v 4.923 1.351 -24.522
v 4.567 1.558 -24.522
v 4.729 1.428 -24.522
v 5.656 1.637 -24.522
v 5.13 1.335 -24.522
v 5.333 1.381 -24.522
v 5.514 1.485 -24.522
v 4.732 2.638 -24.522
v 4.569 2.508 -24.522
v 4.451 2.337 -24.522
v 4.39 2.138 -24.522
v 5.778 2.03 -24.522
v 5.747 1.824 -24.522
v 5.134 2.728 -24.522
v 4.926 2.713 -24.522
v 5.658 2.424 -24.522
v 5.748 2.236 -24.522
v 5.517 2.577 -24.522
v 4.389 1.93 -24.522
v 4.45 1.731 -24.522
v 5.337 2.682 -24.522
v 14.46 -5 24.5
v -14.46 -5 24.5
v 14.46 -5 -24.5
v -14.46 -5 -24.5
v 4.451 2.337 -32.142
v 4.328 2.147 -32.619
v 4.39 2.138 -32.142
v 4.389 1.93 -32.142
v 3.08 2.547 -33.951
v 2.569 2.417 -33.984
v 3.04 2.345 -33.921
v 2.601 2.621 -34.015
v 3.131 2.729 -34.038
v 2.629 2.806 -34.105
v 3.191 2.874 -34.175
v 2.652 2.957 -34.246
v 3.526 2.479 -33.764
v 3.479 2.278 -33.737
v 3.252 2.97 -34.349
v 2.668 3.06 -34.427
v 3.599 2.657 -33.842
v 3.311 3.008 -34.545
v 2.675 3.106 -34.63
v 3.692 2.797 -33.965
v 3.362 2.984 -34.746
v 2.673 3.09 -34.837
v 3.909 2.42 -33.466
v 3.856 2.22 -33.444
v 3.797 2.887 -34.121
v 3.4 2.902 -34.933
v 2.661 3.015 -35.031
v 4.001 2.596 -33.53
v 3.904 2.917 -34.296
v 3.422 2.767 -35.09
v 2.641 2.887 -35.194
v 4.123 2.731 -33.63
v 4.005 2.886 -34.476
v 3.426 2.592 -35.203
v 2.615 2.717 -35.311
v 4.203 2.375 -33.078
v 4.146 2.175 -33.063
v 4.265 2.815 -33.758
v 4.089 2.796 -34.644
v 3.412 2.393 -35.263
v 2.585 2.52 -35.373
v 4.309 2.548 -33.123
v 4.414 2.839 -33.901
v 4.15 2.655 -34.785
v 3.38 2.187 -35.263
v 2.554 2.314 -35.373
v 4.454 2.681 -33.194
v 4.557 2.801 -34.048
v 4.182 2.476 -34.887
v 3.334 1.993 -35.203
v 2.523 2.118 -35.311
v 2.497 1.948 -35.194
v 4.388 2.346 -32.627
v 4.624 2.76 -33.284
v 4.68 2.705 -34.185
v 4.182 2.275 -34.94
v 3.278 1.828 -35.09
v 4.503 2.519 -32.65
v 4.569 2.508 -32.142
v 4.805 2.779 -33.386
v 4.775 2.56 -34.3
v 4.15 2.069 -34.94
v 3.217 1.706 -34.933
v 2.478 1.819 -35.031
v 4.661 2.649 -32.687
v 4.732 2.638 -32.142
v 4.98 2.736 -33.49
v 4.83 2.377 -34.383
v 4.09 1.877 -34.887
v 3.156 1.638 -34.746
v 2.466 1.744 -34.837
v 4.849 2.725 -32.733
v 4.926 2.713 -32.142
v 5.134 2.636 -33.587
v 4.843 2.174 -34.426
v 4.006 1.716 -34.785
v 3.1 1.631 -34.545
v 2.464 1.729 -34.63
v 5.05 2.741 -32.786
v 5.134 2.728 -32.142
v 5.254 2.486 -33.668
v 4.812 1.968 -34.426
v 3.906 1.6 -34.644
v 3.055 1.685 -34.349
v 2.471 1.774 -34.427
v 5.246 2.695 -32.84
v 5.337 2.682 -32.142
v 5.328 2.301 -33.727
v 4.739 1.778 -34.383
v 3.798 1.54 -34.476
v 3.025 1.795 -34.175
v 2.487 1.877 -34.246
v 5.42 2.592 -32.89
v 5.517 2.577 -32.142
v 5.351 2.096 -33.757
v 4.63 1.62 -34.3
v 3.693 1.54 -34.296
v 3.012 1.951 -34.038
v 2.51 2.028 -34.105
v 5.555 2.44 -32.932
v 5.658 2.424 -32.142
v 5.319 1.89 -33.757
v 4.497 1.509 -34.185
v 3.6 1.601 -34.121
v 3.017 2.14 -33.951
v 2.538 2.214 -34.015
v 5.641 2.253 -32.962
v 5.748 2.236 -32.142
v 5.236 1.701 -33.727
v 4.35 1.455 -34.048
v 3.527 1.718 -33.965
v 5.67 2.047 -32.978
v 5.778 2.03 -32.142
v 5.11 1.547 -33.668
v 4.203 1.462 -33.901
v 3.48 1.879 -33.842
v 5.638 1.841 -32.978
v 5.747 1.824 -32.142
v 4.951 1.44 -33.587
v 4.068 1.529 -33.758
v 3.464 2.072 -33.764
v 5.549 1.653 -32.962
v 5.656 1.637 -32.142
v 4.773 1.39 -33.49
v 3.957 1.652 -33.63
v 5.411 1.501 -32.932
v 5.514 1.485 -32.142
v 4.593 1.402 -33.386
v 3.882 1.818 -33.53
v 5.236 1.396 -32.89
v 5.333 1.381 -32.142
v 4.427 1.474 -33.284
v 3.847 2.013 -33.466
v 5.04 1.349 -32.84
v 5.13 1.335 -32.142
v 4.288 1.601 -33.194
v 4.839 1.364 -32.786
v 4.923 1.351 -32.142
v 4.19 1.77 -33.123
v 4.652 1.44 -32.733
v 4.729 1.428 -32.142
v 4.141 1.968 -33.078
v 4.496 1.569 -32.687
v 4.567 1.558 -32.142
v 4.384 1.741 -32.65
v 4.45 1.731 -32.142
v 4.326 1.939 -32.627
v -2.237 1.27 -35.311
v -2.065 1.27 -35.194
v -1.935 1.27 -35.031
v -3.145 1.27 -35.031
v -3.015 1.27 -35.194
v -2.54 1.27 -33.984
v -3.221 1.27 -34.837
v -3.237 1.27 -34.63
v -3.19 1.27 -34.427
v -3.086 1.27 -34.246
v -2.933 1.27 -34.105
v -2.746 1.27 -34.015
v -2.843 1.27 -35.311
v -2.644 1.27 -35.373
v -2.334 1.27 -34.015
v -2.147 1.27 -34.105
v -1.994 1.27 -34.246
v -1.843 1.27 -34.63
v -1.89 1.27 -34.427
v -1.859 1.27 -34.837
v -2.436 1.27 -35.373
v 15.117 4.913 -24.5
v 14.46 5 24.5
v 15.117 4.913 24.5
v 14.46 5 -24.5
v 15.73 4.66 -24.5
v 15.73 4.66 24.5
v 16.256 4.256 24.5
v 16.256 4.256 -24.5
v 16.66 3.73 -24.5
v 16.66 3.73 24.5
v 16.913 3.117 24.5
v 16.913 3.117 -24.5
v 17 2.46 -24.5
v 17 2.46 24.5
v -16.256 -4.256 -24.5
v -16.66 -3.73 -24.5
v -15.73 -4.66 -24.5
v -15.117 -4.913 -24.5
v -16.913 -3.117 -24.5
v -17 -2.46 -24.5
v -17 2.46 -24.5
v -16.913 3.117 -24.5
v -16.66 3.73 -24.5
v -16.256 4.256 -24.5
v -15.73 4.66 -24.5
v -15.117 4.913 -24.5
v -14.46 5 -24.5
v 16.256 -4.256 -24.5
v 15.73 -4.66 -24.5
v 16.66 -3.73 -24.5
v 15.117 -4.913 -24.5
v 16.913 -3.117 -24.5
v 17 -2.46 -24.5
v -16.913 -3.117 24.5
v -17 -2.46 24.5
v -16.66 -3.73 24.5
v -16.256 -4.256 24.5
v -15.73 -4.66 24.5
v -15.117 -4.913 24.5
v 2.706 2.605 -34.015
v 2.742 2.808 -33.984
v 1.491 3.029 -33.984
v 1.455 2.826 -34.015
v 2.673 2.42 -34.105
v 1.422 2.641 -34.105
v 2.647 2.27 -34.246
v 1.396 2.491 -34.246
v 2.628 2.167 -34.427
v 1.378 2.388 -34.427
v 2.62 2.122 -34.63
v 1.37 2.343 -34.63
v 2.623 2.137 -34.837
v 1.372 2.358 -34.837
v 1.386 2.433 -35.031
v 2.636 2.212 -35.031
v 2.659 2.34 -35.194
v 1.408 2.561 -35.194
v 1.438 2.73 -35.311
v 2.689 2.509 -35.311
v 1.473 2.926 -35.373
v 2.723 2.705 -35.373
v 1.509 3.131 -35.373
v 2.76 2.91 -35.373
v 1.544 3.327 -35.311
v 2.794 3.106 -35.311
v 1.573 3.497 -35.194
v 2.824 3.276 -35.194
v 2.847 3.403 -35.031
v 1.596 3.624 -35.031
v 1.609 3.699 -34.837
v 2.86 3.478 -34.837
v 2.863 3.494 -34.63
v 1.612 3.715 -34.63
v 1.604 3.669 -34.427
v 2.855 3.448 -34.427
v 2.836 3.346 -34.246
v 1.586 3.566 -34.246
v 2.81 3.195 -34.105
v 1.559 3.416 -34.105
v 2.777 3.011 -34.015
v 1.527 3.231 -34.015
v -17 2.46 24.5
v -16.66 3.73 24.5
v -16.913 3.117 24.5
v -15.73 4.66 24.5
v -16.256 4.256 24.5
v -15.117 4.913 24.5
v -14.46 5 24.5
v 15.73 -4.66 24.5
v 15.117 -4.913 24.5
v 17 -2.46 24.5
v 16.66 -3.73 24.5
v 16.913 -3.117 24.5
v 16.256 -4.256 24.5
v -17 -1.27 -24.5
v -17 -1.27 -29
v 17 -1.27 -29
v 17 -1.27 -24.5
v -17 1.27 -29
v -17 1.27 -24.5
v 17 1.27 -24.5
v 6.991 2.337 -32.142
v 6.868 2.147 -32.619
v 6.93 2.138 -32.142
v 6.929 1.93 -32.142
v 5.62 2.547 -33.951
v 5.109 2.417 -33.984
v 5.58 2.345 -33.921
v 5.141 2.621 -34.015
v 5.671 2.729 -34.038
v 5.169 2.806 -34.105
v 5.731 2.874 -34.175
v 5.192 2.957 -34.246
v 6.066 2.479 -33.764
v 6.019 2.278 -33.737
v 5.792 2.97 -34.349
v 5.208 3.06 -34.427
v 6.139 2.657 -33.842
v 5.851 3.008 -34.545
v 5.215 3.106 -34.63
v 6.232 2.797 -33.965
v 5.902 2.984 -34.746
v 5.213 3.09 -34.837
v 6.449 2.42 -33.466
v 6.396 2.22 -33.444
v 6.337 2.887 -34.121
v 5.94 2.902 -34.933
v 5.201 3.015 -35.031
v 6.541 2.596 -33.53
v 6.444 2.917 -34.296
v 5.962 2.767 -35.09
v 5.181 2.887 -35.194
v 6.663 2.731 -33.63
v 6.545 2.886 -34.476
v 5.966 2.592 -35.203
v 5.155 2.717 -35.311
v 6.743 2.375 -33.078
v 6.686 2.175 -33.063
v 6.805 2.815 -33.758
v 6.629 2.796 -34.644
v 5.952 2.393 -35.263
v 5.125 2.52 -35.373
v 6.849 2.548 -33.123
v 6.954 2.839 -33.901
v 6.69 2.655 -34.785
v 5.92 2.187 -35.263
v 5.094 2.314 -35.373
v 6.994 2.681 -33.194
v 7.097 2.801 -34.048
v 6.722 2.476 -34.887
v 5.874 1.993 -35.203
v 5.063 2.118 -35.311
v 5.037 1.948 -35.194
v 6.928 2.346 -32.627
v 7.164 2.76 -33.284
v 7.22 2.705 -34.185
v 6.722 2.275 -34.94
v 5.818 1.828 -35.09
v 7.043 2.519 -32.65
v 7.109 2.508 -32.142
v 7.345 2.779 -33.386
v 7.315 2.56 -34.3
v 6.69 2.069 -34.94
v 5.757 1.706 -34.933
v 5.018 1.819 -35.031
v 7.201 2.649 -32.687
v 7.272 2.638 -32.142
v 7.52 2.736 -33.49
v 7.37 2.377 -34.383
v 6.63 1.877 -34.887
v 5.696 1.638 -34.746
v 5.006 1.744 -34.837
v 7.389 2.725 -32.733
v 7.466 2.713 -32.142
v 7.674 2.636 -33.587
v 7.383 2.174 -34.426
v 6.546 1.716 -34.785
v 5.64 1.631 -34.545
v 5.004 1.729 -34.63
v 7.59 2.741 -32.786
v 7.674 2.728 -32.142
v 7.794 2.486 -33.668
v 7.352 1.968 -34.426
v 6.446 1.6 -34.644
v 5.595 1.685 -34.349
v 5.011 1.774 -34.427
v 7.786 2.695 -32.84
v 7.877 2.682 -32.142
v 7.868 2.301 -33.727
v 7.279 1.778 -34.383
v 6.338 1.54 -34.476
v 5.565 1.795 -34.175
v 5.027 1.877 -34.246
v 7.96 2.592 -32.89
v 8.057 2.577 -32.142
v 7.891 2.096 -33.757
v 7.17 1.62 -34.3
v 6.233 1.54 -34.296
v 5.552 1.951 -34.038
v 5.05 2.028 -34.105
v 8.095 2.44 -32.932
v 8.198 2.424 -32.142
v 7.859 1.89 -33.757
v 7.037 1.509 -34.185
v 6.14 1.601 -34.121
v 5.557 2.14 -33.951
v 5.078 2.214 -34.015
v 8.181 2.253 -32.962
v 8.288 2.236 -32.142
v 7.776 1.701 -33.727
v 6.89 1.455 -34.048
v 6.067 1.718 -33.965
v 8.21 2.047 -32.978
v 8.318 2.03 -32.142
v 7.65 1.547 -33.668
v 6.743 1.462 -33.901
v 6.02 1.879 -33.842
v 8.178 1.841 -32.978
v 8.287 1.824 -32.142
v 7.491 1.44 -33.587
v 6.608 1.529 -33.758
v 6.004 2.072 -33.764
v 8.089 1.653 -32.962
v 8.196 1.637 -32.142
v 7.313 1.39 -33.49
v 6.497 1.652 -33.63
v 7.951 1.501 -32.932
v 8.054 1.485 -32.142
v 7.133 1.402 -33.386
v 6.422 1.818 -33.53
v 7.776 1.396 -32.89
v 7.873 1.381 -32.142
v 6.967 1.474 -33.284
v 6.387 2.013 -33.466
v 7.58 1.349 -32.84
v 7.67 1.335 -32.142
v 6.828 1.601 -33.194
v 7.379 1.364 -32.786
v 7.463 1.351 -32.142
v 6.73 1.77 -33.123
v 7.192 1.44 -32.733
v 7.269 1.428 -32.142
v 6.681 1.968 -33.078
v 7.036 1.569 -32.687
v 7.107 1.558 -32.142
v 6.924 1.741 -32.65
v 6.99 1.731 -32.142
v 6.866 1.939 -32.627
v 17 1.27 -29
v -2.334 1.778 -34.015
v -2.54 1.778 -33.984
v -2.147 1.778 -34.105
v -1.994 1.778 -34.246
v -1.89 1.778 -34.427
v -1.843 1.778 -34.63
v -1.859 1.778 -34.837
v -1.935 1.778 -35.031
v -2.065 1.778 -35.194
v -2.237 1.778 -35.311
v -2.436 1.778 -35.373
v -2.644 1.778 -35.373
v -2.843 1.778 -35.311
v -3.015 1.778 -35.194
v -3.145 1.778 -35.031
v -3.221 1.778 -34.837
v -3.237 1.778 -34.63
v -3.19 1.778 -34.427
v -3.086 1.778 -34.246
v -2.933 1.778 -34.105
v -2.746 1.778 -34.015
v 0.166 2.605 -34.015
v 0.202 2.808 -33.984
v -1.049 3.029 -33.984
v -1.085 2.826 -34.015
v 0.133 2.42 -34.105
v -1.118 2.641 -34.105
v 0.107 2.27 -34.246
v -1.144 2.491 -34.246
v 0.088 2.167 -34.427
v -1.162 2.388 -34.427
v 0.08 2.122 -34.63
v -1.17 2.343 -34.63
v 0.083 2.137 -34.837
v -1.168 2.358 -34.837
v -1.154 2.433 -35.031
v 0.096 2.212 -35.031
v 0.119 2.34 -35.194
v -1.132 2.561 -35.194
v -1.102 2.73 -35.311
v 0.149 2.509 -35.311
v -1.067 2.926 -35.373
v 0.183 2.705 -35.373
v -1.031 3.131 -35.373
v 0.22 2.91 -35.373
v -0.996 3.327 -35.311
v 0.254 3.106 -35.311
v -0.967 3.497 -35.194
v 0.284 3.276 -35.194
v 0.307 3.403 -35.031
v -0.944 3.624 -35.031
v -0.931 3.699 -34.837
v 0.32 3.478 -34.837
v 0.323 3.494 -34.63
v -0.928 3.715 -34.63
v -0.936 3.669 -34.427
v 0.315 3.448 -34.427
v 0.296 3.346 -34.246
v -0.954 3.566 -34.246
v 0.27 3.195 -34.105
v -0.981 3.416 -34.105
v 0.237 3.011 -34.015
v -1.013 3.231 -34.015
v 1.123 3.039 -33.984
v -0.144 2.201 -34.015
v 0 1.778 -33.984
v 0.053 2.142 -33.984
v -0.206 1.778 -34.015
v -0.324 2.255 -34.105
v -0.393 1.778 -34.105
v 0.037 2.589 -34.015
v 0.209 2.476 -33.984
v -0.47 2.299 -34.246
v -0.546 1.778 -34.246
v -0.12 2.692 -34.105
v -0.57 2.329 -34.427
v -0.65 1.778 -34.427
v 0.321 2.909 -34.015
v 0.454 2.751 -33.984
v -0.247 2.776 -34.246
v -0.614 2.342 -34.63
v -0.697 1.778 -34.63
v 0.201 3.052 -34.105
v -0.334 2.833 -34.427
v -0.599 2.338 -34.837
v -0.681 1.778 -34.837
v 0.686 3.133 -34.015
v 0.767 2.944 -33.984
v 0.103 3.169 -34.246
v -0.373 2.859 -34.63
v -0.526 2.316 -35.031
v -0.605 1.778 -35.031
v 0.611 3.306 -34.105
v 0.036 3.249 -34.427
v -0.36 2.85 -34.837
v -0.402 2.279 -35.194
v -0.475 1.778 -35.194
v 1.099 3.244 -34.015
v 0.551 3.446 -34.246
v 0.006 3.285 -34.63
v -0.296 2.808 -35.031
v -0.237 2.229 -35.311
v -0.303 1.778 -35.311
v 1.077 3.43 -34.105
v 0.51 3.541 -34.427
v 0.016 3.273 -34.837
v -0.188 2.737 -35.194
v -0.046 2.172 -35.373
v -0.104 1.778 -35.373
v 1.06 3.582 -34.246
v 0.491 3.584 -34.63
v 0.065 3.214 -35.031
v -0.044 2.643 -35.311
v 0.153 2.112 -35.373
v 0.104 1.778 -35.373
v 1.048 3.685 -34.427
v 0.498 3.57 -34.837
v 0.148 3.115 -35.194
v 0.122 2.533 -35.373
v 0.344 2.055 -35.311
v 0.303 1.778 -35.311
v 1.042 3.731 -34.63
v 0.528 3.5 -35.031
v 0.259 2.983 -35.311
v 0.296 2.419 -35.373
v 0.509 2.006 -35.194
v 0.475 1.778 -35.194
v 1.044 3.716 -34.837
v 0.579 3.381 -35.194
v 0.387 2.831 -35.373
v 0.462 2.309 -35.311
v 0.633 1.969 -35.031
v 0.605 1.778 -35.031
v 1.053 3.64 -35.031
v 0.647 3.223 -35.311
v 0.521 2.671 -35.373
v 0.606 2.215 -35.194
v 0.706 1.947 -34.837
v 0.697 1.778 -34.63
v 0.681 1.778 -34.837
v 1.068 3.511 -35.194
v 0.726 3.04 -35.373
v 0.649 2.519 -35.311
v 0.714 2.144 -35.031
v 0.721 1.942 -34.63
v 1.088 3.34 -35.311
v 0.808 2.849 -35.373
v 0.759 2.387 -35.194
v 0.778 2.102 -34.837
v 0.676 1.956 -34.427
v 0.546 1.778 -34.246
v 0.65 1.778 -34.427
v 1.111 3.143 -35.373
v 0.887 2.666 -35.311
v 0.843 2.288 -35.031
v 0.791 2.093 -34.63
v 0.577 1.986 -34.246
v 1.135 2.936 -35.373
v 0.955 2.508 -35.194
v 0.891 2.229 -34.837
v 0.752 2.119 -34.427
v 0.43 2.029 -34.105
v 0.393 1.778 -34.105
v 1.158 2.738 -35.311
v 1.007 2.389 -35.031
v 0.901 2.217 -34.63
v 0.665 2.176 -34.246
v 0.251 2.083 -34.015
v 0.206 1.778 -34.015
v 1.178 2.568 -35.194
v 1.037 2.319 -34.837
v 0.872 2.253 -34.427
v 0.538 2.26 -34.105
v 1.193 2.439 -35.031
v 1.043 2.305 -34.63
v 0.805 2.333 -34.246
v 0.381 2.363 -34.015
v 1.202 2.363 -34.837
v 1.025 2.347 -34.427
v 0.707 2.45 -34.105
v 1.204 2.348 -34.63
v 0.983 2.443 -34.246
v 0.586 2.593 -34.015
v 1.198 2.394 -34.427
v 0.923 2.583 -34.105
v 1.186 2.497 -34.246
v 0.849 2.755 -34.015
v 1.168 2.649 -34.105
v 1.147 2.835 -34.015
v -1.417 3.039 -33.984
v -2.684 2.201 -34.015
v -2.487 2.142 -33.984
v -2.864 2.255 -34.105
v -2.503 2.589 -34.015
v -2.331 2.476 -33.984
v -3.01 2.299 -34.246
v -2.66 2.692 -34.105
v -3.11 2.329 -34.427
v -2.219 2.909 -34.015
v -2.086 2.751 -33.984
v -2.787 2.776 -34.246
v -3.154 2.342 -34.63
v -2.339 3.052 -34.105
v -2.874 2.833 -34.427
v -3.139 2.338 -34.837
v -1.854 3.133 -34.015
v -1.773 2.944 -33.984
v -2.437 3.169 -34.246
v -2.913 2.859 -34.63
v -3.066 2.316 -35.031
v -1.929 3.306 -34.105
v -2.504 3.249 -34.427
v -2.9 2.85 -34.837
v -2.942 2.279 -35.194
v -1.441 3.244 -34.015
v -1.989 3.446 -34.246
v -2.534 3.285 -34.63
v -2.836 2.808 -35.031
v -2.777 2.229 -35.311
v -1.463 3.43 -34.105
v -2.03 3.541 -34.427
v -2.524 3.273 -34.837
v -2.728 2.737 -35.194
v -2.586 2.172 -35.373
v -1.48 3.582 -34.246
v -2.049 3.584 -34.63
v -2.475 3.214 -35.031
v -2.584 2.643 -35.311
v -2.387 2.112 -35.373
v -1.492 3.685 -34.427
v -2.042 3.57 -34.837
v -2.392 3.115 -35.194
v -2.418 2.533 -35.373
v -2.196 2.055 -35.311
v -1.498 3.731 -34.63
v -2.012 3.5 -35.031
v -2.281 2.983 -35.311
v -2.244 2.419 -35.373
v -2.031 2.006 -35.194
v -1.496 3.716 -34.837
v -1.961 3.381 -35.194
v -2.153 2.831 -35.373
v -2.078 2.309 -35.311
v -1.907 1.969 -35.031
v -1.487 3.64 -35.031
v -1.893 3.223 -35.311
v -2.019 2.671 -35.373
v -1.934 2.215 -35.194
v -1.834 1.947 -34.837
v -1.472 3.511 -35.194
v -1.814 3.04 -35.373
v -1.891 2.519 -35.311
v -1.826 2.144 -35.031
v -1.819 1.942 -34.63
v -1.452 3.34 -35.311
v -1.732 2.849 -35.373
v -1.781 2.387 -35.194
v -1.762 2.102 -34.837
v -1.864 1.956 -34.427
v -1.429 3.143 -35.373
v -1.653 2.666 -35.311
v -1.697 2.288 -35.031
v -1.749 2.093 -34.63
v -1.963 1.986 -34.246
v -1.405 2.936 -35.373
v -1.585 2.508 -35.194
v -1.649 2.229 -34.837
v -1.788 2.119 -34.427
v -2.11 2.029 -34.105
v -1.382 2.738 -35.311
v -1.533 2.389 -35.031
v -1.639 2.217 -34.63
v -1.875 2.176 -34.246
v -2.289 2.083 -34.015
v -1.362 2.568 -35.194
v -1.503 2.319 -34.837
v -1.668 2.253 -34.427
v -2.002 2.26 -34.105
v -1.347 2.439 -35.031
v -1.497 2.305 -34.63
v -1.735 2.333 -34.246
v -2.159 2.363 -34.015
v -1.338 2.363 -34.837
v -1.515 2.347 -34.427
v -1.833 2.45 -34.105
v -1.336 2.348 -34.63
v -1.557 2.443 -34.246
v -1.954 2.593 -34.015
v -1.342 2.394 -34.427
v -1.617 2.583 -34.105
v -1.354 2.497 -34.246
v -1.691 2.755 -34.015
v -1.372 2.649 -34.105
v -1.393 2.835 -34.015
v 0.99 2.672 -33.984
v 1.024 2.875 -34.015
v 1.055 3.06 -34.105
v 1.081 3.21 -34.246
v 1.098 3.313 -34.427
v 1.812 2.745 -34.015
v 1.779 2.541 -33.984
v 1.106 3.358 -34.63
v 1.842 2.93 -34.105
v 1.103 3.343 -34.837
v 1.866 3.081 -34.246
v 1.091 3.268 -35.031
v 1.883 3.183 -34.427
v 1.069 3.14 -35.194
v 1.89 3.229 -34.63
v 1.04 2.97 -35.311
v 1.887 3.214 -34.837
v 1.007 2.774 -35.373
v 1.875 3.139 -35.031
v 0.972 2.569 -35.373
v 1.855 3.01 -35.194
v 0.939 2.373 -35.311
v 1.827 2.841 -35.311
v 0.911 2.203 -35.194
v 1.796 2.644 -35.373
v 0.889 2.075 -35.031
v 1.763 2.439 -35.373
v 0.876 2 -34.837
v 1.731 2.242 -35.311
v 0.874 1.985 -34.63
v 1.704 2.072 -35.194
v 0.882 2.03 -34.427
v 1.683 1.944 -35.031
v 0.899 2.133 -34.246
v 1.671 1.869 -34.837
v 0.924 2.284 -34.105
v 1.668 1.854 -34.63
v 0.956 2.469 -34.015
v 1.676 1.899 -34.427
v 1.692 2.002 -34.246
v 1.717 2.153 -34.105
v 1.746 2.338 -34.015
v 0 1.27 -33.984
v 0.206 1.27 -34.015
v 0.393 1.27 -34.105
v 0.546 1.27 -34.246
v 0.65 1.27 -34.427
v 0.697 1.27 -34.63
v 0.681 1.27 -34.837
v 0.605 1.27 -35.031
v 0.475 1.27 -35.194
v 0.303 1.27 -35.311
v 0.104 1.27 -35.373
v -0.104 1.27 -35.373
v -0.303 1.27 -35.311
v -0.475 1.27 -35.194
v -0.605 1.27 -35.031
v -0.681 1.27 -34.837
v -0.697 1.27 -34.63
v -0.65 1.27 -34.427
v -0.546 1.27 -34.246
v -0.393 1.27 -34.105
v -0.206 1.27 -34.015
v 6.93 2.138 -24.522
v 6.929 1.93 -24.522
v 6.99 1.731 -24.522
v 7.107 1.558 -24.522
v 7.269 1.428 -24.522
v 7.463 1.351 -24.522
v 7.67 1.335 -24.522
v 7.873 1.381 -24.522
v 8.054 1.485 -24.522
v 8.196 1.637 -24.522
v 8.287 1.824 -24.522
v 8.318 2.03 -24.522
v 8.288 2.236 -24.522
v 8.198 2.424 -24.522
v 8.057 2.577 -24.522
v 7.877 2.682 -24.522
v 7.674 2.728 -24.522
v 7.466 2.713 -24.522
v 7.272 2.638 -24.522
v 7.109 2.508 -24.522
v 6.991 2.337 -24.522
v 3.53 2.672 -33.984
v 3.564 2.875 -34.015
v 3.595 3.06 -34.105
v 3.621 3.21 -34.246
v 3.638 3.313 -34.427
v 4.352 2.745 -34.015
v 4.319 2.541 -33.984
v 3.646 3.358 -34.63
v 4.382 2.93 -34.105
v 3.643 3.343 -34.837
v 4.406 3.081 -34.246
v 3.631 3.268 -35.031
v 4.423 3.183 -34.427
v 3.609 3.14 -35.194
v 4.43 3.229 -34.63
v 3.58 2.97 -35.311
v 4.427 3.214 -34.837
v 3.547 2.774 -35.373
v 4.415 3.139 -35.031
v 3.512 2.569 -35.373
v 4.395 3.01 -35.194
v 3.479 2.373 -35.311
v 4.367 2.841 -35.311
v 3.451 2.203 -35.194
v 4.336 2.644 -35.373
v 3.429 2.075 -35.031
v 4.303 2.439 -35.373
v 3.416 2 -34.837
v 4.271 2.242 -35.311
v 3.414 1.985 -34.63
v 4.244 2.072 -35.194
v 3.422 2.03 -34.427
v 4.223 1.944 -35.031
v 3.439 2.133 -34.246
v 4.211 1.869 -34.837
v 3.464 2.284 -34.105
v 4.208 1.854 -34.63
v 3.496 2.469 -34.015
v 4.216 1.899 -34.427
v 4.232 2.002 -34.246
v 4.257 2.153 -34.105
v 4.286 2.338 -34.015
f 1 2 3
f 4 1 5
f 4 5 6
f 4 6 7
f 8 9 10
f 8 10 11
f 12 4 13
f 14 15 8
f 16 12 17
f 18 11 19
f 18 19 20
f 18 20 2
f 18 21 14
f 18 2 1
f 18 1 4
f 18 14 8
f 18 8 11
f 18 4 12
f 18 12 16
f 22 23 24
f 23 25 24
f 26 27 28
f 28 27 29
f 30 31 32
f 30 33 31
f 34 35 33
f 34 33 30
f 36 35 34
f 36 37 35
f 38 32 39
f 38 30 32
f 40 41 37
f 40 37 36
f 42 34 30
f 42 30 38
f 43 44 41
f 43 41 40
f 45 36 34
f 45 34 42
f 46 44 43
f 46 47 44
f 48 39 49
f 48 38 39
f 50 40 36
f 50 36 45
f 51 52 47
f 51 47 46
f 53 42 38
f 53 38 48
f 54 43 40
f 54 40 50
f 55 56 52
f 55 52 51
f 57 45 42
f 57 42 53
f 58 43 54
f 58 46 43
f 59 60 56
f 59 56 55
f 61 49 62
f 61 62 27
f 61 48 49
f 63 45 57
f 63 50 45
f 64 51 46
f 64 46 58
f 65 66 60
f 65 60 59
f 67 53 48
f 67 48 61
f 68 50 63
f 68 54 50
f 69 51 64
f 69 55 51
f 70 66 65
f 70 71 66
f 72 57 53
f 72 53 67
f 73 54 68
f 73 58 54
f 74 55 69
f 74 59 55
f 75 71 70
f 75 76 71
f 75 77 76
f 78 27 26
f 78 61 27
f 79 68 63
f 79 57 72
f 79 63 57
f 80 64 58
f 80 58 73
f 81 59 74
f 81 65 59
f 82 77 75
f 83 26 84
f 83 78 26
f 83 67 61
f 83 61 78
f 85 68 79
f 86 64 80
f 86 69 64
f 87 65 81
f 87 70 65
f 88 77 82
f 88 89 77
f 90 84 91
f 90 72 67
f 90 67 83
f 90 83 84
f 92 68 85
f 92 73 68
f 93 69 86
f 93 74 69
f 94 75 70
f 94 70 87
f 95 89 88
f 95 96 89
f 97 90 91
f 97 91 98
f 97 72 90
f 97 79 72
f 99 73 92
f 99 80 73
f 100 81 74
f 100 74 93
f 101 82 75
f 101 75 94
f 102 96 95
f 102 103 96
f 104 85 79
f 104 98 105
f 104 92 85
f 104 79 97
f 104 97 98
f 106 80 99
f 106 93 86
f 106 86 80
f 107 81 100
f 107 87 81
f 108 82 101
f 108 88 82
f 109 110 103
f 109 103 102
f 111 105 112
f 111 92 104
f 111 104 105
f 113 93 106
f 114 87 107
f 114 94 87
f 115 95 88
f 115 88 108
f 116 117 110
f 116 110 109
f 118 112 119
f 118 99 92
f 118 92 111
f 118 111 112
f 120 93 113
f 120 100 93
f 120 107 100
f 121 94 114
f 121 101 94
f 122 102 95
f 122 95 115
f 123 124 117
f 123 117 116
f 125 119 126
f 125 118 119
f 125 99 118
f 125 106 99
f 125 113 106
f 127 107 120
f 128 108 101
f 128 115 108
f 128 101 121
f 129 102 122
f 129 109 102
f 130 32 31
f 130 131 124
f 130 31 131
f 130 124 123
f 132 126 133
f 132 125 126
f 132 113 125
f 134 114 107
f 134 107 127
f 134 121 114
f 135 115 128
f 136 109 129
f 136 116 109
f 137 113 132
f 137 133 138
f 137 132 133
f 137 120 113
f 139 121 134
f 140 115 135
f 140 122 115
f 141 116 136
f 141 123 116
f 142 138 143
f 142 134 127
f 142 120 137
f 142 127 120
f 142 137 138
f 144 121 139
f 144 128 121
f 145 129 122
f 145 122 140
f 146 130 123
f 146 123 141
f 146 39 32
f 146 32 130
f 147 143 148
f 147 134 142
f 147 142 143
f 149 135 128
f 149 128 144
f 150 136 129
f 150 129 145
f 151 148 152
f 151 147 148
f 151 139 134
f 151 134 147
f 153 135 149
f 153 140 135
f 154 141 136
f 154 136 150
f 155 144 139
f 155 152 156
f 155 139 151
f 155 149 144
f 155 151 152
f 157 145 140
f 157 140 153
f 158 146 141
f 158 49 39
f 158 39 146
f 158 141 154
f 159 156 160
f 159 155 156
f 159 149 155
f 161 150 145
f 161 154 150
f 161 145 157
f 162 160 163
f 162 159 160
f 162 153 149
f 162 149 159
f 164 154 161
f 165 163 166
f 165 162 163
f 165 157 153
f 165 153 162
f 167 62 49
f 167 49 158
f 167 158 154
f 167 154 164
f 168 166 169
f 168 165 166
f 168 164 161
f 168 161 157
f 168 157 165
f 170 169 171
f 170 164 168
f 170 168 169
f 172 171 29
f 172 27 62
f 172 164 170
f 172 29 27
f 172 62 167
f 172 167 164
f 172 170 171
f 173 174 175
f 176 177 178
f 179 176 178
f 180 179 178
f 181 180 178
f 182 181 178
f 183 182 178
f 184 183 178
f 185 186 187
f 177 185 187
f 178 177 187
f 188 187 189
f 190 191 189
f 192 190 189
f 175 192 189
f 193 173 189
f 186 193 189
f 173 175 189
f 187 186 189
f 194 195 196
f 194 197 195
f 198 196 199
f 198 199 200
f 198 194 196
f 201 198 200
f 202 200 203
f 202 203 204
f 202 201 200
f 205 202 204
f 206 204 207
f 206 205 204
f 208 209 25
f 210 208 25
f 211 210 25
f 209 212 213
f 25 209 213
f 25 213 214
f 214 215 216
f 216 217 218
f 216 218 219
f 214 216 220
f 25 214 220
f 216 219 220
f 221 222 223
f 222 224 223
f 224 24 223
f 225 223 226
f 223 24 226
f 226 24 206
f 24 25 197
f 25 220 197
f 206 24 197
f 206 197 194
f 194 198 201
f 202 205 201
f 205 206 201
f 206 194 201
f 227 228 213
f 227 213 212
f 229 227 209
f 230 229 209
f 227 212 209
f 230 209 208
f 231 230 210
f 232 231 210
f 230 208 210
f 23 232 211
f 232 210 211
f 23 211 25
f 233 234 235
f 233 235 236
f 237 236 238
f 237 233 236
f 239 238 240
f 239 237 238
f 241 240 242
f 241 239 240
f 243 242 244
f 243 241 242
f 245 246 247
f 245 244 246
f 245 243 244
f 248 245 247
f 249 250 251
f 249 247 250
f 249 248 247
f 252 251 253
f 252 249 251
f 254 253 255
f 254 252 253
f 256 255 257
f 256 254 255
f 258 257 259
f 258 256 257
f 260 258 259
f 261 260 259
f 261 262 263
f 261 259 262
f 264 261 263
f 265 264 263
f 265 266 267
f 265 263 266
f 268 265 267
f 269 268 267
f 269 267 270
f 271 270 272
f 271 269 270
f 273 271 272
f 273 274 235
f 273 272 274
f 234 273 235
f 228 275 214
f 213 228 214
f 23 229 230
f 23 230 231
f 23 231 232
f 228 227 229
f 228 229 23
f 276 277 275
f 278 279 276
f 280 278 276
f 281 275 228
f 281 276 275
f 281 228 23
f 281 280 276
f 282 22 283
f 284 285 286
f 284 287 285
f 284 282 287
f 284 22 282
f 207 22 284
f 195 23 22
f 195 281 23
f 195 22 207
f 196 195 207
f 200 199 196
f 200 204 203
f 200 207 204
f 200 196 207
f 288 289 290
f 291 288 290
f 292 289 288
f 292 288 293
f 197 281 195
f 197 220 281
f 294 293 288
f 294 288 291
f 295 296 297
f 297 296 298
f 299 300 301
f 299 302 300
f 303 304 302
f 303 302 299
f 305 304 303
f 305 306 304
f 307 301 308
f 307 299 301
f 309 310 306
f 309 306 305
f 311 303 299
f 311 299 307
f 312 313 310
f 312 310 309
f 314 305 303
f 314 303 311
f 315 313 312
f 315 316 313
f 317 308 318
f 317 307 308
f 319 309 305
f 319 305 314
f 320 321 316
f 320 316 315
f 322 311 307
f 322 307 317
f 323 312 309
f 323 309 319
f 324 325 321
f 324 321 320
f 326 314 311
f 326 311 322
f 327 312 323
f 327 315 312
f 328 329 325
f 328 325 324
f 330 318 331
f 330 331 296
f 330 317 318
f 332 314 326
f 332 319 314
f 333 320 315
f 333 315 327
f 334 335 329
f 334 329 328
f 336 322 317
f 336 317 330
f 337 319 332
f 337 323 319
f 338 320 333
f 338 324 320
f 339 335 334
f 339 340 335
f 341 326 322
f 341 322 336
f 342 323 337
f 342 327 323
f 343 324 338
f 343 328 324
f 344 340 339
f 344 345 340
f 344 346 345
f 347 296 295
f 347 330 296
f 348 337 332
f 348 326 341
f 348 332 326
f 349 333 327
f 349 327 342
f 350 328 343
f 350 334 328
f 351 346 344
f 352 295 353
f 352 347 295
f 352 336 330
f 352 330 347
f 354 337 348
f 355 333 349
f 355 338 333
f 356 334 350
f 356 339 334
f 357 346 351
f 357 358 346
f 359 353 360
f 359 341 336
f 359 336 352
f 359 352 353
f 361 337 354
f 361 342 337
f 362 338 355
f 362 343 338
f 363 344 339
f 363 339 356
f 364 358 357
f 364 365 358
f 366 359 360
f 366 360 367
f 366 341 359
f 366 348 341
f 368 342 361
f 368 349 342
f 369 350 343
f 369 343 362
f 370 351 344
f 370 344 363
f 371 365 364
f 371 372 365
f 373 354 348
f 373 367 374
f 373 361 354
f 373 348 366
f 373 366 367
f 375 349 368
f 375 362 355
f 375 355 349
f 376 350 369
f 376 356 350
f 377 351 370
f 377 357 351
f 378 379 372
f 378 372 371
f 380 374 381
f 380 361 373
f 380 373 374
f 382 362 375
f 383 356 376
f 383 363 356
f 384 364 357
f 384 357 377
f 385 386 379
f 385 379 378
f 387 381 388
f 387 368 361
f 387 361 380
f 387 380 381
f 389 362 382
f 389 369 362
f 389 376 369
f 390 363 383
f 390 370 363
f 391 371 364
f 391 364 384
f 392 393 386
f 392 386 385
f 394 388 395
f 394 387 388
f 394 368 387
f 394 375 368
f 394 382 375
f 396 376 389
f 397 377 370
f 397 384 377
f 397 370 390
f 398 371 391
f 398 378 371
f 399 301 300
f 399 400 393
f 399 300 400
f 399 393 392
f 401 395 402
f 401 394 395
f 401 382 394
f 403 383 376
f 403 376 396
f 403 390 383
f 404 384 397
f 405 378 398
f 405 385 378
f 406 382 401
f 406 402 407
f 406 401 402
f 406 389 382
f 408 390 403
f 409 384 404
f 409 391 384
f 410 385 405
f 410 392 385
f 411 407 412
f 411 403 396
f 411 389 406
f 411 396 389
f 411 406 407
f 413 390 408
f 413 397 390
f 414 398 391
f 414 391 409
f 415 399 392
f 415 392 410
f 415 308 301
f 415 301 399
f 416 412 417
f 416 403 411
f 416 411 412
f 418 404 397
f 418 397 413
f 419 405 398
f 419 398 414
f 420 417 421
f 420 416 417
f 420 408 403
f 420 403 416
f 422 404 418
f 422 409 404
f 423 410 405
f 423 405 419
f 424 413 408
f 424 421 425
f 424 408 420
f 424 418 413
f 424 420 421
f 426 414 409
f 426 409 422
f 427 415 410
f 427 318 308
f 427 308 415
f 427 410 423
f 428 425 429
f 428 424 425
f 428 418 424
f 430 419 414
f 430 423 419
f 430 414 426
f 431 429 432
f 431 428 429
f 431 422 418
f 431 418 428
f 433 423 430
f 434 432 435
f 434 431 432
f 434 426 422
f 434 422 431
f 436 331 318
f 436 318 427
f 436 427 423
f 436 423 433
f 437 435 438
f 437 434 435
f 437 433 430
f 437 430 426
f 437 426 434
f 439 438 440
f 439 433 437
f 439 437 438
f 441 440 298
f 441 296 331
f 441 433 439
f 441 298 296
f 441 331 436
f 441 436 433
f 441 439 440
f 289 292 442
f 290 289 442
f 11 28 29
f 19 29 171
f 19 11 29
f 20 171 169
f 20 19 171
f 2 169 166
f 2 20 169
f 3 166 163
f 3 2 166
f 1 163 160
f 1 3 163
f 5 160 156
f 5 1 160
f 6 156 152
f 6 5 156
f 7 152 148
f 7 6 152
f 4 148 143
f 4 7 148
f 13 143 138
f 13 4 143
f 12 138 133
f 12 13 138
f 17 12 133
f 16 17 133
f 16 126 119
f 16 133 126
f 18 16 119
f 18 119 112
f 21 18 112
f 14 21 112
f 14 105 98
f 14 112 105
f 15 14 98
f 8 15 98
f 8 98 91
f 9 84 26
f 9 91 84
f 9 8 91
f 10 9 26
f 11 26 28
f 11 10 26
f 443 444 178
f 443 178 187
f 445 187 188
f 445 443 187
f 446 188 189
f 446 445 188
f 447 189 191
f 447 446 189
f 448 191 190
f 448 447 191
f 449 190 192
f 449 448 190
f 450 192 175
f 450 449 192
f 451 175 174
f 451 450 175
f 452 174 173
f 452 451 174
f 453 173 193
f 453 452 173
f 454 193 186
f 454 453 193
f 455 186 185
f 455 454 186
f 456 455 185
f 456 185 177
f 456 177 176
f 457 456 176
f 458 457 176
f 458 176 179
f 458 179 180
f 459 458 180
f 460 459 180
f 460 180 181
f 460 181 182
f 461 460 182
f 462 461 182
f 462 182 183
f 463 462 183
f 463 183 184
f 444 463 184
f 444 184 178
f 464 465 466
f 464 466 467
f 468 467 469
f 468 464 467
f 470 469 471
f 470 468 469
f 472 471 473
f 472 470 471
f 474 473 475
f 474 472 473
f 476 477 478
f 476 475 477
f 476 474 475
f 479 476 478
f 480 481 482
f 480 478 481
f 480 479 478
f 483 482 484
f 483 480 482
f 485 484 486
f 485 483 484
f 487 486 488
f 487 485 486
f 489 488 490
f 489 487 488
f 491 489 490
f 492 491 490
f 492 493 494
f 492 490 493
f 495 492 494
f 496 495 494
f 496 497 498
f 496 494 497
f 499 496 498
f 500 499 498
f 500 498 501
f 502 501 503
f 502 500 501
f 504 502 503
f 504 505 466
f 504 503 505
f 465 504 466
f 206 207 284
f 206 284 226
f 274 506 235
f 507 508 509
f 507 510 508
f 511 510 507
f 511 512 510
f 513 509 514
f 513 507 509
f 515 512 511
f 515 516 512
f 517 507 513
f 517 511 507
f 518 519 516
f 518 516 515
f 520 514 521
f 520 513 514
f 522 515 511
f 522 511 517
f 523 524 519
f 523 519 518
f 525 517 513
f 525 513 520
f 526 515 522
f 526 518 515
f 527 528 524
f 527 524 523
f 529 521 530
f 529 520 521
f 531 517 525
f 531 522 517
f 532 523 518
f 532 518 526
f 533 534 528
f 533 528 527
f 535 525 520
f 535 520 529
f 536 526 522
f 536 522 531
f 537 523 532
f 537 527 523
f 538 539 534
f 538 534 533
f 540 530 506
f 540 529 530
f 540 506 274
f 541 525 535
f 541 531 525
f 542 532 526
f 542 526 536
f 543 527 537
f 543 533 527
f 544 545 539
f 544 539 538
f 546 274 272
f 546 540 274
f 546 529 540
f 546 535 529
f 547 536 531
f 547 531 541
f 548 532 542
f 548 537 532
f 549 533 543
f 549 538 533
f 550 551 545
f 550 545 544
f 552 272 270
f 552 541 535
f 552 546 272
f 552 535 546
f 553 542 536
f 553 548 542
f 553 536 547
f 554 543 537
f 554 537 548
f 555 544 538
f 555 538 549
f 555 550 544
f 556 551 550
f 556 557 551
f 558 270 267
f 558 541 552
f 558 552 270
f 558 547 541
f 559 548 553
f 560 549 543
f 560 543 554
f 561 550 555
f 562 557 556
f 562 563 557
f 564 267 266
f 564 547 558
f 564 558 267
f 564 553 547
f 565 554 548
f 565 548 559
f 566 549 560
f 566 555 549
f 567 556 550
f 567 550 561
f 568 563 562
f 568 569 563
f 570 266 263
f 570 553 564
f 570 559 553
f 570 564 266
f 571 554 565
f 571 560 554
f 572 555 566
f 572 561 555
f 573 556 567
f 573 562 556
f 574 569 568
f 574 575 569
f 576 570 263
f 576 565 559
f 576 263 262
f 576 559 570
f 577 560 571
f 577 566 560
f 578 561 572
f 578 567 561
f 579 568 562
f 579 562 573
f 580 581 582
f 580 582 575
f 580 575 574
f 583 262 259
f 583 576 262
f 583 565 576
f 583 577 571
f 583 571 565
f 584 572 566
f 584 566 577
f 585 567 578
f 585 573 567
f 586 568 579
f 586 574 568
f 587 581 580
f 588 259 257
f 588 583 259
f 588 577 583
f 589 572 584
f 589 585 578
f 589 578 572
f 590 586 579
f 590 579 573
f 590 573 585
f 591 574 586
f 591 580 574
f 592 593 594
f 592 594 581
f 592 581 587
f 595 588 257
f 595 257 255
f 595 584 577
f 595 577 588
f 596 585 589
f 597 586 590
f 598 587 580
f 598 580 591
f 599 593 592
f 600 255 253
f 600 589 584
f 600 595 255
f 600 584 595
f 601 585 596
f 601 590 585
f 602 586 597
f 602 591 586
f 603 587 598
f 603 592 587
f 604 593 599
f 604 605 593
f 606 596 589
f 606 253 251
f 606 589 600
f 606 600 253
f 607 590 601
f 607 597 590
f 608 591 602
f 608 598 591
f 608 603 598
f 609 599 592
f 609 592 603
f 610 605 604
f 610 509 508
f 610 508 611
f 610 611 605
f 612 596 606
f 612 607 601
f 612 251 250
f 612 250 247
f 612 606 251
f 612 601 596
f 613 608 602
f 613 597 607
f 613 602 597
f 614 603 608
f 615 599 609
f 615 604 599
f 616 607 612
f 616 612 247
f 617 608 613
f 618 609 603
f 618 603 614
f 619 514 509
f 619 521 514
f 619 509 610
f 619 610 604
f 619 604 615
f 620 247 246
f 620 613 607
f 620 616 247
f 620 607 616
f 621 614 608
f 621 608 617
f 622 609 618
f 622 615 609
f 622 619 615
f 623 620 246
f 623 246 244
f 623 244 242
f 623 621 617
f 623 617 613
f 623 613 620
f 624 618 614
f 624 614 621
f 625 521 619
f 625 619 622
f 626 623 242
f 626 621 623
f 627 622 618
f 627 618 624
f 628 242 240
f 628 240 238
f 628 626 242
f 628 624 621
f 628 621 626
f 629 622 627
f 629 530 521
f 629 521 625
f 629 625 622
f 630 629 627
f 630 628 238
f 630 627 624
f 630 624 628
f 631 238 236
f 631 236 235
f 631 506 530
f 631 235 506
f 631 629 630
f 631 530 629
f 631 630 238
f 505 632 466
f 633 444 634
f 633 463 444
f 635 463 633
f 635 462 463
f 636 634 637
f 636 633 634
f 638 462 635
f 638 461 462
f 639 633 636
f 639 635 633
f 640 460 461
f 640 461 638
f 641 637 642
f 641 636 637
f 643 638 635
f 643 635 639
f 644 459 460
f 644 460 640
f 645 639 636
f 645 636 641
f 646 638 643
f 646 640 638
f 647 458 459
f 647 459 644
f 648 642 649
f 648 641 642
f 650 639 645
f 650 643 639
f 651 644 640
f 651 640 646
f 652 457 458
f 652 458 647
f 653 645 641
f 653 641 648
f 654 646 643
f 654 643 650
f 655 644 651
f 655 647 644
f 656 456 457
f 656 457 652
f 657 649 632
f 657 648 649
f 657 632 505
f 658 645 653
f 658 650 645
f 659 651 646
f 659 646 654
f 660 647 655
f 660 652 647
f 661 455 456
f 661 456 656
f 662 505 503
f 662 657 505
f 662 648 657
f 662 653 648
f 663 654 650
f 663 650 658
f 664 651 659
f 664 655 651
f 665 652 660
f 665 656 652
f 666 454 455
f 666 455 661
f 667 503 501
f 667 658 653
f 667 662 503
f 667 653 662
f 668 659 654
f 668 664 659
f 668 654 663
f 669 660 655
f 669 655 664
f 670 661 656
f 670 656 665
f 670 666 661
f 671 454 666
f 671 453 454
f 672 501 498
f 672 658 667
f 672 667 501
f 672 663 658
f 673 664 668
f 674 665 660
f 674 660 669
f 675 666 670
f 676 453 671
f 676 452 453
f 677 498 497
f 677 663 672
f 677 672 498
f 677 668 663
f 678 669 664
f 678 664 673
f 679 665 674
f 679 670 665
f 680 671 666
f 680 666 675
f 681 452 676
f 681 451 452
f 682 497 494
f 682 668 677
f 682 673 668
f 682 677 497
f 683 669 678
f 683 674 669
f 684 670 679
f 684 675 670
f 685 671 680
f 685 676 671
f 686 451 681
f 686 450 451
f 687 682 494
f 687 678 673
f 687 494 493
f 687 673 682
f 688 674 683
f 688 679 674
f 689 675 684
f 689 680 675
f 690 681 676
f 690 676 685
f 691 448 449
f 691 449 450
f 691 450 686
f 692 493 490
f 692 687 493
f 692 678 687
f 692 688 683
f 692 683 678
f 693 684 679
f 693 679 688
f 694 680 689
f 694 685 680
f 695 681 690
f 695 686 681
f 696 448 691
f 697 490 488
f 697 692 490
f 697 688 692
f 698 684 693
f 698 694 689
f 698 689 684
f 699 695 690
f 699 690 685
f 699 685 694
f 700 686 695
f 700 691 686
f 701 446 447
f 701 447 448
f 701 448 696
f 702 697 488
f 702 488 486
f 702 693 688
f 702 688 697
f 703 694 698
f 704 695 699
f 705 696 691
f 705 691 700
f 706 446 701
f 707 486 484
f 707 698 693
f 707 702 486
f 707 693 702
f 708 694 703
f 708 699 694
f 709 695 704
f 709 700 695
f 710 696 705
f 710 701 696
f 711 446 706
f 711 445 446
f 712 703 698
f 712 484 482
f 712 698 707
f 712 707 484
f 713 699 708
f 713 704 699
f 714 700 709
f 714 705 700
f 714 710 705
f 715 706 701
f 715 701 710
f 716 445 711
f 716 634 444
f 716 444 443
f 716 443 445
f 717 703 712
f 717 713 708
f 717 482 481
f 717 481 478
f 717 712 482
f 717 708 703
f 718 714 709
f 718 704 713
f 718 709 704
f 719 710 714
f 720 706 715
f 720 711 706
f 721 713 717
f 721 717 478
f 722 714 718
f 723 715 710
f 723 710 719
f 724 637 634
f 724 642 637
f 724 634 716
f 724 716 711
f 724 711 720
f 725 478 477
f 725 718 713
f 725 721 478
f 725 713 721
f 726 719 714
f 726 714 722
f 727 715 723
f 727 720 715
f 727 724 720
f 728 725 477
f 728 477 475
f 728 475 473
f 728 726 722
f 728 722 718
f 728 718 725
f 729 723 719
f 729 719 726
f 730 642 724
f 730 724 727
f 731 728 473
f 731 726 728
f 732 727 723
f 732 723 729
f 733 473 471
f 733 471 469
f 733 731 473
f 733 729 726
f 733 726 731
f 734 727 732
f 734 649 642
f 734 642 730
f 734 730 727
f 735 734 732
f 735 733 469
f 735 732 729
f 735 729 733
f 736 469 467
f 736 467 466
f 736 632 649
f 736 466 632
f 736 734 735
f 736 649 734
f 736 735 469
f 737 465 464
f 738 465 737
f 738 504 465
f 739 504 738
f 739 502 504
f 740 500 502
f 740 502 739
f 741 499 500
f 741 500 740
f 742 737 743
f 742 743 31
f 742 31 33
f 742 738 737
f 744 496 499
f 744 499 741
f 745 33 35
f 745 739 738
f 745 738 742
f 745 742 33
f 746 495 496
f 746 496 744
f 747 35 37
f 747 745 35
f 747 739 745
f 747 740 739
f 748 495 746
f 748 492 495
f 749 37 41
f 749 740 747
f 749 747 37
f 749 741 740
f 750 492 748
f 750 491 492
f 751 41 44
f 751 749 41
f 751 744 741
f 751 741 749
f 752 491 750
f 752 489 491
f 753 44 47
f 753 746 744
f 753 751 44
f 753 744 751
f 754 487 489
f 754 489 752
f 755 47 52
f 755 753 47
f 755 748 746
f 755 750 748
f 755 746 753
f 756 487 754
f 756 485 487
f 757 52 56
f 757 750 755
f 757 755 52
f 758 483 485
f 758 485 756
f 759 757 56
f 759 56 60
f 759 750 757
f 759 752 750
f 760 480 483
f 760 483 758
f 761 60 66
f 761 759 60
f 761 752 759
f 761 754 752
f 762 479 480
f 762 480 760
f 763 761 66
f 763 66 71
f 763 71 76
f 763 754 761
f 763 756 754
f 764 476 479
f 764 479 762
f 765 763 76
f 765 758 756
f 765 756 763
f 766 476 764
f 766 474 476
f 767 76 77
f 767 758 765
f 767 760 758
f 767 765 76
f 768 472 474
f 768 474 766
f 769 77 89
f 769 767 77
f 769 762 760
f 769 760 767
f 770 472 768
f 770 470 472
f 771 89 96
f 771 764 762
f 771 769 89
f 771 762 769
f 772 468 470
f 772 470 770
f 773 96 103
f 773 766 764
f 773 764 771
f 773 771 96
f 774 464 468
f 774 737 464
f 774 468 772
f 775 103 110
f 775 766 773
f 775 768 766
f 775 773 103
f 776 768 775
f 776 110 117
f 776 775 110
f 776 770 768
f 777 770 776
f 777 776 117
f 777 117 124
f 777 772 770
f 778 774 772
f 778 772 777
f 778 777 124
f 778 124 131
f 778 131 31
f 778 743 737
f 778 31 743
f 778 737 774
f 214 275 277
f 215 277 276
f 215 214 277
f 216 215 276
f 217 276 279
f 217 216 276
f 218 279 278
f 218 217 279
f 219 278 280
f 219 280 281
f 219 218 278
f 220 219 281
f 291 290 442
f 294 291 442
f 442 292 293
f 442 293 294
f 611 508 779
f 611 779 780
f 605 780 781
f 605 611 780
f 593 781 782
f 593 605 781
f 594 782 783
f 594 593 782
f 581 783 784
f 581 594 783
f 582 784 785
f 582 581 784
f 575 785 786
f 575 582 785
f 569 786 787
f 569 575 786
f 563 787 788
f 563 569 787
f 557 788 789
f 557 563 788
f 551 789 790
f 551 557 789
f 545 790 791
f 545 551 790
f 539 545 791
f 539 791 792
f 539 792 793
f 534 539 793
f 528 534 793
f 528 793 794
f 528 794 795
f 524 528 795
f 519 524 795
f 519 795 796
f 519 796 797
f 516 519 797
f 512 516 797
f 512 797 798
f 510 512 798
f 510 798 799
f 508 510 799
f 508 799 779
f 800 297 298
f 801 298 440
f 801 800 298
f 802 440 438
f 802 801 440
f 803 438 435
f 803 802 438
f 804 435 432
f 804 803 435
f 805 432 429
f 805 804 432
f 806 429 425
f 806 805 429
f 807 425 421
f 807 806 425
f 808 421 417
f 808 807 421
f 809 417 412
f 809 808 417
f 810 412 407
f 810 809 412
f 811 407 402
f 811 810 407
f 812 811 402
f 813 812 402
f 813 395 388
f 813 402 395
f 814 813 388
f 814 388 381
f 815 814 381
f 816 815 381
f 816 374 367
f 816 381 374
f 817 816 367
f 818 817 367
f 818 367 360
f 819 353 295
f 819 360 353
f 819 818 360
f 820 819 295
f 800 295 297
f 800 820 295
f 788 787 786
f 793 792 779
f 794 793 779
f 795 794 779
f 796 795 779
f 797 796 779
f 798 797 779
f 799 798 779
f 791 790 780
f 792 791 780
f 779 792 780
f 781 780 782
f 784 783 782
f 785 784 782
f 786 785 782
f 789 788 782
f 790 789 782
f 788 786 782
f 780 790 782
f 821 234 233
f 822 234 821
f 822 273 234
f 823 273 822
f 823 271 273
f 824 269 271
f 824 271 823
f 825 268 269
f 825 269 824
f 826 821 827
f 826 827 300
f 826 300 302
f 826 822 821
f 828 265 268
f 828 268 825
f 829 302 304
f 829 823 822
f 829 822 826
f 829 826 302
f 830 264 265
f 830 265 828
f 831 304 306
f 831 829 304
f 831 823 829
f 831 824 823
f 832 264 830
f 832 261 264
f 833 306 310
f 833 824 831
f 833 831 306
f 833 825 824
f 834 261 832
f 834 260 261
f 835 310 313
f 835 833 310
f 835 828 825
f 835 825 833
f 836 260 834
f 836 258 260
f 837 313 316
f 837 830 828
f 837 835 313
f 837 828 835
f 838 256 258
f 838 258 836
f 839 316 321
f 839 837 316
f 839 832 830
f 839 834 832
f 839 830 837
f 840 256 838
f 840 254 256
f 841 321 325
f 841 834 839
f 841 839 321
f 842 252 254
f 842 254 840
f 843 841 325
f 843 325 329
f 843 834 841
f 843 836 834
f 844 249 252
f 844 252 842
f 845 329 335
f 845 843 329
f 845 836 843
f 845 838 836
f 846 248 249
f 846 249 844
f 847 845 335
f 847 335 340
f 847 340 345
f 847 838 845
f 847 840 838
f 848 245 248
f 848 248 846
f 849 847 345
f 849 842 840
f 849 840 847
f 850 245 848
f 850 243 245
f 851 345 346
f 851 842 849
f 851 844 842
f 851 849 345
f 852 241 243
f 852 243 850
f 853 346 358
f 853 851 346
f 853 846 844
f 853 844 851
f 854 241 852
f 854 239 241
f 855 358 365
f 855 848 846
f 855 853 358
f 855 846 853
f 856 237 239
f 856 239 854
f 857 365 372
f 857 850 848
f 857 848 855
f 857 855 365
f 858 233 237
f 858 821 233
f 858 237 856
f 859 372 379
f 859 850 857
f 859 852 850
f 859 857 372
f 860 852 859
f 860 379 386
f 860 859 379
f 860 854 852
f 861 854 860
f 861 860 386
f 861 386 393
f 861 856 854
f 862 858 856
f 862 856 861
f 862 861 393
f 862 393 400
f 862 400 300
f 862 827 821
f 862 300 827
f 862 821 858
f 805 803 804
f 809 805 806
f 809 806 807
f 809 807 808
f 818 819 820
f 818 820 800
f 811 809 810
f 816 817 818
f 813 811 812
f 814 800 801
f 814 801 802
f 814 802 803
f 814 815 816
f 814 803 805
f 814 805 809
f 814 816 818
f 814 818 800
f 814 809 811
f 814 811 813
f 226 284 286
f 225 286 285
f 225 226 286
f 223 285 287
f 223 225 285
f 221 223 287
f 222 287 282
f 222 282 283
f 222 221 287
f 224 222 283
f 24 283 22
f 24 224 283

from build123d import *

# Parameters (mm, degrees)
SKETCH1_W           = 34
SKETCH1_H           = 49
BOSS_EXTRUDE1_DEPTH = 5
FILLET1_R           = 2.54
BOSS_EXTRUDE2_START = -53.5
SKETCH2_W           = 34
SKETCH2_H           = 2.54
BOSS_EXTRUDE2_DEPTH = 4.5
SWEEP2_PROFILE_R    = 0.6985


with BuildPart() as part:
    # Sketch1 → Boss-Extrude1 (new body, symmetric)
    with BuildSketch(Plane(origin=(0, 0, 0), x_dir=(1, 0, 0), z_dir=(0, 1, 0))):
        Rectangle(SKETCH1_W, SKETCH1_H)
    extrude(amount=BOSS_EXTRUDE1_DEPTH, both=True)

    # Fillet1
    fillet1_edges = [part.edges().sort_by_distance(p)[0] for p in [
        (17, 5, 0),
        (-17, 5, 0),
        (17, -5, 0),
        (-17, -5, 0),
    ]]
    fillet(fillet1_edges, radius=FILLET1_R)


with BuildPart() as body_2:
    # Sketch2 → Boss-Extrude2 (new body)
    with BuildSketch(Plane.XY.offset(24.5).offset(BOSS_EXTRUDE2_START)):
        Rectangle(SKETCH2_W, SKETCH2_H)
    extrude(amount=BOSS_EXTRUDE2_DEPTH)


with BuildPart() as body_3:
    # Sweep2: sweep along a curve in space
    with BuildLine() as sweep2_path:
        Line((-2.54, 1.27, -34.682), (-2.54, 1.778, -34.682))
        ThreePointArc((-2.54, 1.778, -34.682), (-2.086208877, 2.750986674, -34.682), (-1.049129026, 3.028646238, -34.682))
        Line((0.201517212, 2.807775264, -34.682), (-1.049129026, 3.028646238, -34.682))
        ThreePointArc((0.201517212, 2.807775264, -34.682), (1.38433901, 2.605764371, -34.682), (2.569367138, 2.417126777, -34.682))
        ThreePointArc((2.569367138, 2.417126777, -34.682), (4.34465266, 2.144801021, -33.938051224), (5.08, 2.032, -32.142))
        Line((5.08, 2.032, -32.142), (5.08, 2.032, -24.522))
    # Sweep2 profile (on start of the path) → Sweep2 (sweep)
    with BuildSketch(Plane(origin=(-2.54, 1.27, -34.682), x_dir=(0, 0, 1), z_dir=(0, 1, 0))):
        Circle(SWEEP2_PROFILE_R)
    sweep(path=sweep2_path.line)


with BuildPart() as body_4:
    # Body-Move/Copy1: copy of body 3
    add(body_3.part.moved(Location((2.54, 0, 0))))


solid = Compound([part.part, body_2.part, body_3.part, body_4.part])
